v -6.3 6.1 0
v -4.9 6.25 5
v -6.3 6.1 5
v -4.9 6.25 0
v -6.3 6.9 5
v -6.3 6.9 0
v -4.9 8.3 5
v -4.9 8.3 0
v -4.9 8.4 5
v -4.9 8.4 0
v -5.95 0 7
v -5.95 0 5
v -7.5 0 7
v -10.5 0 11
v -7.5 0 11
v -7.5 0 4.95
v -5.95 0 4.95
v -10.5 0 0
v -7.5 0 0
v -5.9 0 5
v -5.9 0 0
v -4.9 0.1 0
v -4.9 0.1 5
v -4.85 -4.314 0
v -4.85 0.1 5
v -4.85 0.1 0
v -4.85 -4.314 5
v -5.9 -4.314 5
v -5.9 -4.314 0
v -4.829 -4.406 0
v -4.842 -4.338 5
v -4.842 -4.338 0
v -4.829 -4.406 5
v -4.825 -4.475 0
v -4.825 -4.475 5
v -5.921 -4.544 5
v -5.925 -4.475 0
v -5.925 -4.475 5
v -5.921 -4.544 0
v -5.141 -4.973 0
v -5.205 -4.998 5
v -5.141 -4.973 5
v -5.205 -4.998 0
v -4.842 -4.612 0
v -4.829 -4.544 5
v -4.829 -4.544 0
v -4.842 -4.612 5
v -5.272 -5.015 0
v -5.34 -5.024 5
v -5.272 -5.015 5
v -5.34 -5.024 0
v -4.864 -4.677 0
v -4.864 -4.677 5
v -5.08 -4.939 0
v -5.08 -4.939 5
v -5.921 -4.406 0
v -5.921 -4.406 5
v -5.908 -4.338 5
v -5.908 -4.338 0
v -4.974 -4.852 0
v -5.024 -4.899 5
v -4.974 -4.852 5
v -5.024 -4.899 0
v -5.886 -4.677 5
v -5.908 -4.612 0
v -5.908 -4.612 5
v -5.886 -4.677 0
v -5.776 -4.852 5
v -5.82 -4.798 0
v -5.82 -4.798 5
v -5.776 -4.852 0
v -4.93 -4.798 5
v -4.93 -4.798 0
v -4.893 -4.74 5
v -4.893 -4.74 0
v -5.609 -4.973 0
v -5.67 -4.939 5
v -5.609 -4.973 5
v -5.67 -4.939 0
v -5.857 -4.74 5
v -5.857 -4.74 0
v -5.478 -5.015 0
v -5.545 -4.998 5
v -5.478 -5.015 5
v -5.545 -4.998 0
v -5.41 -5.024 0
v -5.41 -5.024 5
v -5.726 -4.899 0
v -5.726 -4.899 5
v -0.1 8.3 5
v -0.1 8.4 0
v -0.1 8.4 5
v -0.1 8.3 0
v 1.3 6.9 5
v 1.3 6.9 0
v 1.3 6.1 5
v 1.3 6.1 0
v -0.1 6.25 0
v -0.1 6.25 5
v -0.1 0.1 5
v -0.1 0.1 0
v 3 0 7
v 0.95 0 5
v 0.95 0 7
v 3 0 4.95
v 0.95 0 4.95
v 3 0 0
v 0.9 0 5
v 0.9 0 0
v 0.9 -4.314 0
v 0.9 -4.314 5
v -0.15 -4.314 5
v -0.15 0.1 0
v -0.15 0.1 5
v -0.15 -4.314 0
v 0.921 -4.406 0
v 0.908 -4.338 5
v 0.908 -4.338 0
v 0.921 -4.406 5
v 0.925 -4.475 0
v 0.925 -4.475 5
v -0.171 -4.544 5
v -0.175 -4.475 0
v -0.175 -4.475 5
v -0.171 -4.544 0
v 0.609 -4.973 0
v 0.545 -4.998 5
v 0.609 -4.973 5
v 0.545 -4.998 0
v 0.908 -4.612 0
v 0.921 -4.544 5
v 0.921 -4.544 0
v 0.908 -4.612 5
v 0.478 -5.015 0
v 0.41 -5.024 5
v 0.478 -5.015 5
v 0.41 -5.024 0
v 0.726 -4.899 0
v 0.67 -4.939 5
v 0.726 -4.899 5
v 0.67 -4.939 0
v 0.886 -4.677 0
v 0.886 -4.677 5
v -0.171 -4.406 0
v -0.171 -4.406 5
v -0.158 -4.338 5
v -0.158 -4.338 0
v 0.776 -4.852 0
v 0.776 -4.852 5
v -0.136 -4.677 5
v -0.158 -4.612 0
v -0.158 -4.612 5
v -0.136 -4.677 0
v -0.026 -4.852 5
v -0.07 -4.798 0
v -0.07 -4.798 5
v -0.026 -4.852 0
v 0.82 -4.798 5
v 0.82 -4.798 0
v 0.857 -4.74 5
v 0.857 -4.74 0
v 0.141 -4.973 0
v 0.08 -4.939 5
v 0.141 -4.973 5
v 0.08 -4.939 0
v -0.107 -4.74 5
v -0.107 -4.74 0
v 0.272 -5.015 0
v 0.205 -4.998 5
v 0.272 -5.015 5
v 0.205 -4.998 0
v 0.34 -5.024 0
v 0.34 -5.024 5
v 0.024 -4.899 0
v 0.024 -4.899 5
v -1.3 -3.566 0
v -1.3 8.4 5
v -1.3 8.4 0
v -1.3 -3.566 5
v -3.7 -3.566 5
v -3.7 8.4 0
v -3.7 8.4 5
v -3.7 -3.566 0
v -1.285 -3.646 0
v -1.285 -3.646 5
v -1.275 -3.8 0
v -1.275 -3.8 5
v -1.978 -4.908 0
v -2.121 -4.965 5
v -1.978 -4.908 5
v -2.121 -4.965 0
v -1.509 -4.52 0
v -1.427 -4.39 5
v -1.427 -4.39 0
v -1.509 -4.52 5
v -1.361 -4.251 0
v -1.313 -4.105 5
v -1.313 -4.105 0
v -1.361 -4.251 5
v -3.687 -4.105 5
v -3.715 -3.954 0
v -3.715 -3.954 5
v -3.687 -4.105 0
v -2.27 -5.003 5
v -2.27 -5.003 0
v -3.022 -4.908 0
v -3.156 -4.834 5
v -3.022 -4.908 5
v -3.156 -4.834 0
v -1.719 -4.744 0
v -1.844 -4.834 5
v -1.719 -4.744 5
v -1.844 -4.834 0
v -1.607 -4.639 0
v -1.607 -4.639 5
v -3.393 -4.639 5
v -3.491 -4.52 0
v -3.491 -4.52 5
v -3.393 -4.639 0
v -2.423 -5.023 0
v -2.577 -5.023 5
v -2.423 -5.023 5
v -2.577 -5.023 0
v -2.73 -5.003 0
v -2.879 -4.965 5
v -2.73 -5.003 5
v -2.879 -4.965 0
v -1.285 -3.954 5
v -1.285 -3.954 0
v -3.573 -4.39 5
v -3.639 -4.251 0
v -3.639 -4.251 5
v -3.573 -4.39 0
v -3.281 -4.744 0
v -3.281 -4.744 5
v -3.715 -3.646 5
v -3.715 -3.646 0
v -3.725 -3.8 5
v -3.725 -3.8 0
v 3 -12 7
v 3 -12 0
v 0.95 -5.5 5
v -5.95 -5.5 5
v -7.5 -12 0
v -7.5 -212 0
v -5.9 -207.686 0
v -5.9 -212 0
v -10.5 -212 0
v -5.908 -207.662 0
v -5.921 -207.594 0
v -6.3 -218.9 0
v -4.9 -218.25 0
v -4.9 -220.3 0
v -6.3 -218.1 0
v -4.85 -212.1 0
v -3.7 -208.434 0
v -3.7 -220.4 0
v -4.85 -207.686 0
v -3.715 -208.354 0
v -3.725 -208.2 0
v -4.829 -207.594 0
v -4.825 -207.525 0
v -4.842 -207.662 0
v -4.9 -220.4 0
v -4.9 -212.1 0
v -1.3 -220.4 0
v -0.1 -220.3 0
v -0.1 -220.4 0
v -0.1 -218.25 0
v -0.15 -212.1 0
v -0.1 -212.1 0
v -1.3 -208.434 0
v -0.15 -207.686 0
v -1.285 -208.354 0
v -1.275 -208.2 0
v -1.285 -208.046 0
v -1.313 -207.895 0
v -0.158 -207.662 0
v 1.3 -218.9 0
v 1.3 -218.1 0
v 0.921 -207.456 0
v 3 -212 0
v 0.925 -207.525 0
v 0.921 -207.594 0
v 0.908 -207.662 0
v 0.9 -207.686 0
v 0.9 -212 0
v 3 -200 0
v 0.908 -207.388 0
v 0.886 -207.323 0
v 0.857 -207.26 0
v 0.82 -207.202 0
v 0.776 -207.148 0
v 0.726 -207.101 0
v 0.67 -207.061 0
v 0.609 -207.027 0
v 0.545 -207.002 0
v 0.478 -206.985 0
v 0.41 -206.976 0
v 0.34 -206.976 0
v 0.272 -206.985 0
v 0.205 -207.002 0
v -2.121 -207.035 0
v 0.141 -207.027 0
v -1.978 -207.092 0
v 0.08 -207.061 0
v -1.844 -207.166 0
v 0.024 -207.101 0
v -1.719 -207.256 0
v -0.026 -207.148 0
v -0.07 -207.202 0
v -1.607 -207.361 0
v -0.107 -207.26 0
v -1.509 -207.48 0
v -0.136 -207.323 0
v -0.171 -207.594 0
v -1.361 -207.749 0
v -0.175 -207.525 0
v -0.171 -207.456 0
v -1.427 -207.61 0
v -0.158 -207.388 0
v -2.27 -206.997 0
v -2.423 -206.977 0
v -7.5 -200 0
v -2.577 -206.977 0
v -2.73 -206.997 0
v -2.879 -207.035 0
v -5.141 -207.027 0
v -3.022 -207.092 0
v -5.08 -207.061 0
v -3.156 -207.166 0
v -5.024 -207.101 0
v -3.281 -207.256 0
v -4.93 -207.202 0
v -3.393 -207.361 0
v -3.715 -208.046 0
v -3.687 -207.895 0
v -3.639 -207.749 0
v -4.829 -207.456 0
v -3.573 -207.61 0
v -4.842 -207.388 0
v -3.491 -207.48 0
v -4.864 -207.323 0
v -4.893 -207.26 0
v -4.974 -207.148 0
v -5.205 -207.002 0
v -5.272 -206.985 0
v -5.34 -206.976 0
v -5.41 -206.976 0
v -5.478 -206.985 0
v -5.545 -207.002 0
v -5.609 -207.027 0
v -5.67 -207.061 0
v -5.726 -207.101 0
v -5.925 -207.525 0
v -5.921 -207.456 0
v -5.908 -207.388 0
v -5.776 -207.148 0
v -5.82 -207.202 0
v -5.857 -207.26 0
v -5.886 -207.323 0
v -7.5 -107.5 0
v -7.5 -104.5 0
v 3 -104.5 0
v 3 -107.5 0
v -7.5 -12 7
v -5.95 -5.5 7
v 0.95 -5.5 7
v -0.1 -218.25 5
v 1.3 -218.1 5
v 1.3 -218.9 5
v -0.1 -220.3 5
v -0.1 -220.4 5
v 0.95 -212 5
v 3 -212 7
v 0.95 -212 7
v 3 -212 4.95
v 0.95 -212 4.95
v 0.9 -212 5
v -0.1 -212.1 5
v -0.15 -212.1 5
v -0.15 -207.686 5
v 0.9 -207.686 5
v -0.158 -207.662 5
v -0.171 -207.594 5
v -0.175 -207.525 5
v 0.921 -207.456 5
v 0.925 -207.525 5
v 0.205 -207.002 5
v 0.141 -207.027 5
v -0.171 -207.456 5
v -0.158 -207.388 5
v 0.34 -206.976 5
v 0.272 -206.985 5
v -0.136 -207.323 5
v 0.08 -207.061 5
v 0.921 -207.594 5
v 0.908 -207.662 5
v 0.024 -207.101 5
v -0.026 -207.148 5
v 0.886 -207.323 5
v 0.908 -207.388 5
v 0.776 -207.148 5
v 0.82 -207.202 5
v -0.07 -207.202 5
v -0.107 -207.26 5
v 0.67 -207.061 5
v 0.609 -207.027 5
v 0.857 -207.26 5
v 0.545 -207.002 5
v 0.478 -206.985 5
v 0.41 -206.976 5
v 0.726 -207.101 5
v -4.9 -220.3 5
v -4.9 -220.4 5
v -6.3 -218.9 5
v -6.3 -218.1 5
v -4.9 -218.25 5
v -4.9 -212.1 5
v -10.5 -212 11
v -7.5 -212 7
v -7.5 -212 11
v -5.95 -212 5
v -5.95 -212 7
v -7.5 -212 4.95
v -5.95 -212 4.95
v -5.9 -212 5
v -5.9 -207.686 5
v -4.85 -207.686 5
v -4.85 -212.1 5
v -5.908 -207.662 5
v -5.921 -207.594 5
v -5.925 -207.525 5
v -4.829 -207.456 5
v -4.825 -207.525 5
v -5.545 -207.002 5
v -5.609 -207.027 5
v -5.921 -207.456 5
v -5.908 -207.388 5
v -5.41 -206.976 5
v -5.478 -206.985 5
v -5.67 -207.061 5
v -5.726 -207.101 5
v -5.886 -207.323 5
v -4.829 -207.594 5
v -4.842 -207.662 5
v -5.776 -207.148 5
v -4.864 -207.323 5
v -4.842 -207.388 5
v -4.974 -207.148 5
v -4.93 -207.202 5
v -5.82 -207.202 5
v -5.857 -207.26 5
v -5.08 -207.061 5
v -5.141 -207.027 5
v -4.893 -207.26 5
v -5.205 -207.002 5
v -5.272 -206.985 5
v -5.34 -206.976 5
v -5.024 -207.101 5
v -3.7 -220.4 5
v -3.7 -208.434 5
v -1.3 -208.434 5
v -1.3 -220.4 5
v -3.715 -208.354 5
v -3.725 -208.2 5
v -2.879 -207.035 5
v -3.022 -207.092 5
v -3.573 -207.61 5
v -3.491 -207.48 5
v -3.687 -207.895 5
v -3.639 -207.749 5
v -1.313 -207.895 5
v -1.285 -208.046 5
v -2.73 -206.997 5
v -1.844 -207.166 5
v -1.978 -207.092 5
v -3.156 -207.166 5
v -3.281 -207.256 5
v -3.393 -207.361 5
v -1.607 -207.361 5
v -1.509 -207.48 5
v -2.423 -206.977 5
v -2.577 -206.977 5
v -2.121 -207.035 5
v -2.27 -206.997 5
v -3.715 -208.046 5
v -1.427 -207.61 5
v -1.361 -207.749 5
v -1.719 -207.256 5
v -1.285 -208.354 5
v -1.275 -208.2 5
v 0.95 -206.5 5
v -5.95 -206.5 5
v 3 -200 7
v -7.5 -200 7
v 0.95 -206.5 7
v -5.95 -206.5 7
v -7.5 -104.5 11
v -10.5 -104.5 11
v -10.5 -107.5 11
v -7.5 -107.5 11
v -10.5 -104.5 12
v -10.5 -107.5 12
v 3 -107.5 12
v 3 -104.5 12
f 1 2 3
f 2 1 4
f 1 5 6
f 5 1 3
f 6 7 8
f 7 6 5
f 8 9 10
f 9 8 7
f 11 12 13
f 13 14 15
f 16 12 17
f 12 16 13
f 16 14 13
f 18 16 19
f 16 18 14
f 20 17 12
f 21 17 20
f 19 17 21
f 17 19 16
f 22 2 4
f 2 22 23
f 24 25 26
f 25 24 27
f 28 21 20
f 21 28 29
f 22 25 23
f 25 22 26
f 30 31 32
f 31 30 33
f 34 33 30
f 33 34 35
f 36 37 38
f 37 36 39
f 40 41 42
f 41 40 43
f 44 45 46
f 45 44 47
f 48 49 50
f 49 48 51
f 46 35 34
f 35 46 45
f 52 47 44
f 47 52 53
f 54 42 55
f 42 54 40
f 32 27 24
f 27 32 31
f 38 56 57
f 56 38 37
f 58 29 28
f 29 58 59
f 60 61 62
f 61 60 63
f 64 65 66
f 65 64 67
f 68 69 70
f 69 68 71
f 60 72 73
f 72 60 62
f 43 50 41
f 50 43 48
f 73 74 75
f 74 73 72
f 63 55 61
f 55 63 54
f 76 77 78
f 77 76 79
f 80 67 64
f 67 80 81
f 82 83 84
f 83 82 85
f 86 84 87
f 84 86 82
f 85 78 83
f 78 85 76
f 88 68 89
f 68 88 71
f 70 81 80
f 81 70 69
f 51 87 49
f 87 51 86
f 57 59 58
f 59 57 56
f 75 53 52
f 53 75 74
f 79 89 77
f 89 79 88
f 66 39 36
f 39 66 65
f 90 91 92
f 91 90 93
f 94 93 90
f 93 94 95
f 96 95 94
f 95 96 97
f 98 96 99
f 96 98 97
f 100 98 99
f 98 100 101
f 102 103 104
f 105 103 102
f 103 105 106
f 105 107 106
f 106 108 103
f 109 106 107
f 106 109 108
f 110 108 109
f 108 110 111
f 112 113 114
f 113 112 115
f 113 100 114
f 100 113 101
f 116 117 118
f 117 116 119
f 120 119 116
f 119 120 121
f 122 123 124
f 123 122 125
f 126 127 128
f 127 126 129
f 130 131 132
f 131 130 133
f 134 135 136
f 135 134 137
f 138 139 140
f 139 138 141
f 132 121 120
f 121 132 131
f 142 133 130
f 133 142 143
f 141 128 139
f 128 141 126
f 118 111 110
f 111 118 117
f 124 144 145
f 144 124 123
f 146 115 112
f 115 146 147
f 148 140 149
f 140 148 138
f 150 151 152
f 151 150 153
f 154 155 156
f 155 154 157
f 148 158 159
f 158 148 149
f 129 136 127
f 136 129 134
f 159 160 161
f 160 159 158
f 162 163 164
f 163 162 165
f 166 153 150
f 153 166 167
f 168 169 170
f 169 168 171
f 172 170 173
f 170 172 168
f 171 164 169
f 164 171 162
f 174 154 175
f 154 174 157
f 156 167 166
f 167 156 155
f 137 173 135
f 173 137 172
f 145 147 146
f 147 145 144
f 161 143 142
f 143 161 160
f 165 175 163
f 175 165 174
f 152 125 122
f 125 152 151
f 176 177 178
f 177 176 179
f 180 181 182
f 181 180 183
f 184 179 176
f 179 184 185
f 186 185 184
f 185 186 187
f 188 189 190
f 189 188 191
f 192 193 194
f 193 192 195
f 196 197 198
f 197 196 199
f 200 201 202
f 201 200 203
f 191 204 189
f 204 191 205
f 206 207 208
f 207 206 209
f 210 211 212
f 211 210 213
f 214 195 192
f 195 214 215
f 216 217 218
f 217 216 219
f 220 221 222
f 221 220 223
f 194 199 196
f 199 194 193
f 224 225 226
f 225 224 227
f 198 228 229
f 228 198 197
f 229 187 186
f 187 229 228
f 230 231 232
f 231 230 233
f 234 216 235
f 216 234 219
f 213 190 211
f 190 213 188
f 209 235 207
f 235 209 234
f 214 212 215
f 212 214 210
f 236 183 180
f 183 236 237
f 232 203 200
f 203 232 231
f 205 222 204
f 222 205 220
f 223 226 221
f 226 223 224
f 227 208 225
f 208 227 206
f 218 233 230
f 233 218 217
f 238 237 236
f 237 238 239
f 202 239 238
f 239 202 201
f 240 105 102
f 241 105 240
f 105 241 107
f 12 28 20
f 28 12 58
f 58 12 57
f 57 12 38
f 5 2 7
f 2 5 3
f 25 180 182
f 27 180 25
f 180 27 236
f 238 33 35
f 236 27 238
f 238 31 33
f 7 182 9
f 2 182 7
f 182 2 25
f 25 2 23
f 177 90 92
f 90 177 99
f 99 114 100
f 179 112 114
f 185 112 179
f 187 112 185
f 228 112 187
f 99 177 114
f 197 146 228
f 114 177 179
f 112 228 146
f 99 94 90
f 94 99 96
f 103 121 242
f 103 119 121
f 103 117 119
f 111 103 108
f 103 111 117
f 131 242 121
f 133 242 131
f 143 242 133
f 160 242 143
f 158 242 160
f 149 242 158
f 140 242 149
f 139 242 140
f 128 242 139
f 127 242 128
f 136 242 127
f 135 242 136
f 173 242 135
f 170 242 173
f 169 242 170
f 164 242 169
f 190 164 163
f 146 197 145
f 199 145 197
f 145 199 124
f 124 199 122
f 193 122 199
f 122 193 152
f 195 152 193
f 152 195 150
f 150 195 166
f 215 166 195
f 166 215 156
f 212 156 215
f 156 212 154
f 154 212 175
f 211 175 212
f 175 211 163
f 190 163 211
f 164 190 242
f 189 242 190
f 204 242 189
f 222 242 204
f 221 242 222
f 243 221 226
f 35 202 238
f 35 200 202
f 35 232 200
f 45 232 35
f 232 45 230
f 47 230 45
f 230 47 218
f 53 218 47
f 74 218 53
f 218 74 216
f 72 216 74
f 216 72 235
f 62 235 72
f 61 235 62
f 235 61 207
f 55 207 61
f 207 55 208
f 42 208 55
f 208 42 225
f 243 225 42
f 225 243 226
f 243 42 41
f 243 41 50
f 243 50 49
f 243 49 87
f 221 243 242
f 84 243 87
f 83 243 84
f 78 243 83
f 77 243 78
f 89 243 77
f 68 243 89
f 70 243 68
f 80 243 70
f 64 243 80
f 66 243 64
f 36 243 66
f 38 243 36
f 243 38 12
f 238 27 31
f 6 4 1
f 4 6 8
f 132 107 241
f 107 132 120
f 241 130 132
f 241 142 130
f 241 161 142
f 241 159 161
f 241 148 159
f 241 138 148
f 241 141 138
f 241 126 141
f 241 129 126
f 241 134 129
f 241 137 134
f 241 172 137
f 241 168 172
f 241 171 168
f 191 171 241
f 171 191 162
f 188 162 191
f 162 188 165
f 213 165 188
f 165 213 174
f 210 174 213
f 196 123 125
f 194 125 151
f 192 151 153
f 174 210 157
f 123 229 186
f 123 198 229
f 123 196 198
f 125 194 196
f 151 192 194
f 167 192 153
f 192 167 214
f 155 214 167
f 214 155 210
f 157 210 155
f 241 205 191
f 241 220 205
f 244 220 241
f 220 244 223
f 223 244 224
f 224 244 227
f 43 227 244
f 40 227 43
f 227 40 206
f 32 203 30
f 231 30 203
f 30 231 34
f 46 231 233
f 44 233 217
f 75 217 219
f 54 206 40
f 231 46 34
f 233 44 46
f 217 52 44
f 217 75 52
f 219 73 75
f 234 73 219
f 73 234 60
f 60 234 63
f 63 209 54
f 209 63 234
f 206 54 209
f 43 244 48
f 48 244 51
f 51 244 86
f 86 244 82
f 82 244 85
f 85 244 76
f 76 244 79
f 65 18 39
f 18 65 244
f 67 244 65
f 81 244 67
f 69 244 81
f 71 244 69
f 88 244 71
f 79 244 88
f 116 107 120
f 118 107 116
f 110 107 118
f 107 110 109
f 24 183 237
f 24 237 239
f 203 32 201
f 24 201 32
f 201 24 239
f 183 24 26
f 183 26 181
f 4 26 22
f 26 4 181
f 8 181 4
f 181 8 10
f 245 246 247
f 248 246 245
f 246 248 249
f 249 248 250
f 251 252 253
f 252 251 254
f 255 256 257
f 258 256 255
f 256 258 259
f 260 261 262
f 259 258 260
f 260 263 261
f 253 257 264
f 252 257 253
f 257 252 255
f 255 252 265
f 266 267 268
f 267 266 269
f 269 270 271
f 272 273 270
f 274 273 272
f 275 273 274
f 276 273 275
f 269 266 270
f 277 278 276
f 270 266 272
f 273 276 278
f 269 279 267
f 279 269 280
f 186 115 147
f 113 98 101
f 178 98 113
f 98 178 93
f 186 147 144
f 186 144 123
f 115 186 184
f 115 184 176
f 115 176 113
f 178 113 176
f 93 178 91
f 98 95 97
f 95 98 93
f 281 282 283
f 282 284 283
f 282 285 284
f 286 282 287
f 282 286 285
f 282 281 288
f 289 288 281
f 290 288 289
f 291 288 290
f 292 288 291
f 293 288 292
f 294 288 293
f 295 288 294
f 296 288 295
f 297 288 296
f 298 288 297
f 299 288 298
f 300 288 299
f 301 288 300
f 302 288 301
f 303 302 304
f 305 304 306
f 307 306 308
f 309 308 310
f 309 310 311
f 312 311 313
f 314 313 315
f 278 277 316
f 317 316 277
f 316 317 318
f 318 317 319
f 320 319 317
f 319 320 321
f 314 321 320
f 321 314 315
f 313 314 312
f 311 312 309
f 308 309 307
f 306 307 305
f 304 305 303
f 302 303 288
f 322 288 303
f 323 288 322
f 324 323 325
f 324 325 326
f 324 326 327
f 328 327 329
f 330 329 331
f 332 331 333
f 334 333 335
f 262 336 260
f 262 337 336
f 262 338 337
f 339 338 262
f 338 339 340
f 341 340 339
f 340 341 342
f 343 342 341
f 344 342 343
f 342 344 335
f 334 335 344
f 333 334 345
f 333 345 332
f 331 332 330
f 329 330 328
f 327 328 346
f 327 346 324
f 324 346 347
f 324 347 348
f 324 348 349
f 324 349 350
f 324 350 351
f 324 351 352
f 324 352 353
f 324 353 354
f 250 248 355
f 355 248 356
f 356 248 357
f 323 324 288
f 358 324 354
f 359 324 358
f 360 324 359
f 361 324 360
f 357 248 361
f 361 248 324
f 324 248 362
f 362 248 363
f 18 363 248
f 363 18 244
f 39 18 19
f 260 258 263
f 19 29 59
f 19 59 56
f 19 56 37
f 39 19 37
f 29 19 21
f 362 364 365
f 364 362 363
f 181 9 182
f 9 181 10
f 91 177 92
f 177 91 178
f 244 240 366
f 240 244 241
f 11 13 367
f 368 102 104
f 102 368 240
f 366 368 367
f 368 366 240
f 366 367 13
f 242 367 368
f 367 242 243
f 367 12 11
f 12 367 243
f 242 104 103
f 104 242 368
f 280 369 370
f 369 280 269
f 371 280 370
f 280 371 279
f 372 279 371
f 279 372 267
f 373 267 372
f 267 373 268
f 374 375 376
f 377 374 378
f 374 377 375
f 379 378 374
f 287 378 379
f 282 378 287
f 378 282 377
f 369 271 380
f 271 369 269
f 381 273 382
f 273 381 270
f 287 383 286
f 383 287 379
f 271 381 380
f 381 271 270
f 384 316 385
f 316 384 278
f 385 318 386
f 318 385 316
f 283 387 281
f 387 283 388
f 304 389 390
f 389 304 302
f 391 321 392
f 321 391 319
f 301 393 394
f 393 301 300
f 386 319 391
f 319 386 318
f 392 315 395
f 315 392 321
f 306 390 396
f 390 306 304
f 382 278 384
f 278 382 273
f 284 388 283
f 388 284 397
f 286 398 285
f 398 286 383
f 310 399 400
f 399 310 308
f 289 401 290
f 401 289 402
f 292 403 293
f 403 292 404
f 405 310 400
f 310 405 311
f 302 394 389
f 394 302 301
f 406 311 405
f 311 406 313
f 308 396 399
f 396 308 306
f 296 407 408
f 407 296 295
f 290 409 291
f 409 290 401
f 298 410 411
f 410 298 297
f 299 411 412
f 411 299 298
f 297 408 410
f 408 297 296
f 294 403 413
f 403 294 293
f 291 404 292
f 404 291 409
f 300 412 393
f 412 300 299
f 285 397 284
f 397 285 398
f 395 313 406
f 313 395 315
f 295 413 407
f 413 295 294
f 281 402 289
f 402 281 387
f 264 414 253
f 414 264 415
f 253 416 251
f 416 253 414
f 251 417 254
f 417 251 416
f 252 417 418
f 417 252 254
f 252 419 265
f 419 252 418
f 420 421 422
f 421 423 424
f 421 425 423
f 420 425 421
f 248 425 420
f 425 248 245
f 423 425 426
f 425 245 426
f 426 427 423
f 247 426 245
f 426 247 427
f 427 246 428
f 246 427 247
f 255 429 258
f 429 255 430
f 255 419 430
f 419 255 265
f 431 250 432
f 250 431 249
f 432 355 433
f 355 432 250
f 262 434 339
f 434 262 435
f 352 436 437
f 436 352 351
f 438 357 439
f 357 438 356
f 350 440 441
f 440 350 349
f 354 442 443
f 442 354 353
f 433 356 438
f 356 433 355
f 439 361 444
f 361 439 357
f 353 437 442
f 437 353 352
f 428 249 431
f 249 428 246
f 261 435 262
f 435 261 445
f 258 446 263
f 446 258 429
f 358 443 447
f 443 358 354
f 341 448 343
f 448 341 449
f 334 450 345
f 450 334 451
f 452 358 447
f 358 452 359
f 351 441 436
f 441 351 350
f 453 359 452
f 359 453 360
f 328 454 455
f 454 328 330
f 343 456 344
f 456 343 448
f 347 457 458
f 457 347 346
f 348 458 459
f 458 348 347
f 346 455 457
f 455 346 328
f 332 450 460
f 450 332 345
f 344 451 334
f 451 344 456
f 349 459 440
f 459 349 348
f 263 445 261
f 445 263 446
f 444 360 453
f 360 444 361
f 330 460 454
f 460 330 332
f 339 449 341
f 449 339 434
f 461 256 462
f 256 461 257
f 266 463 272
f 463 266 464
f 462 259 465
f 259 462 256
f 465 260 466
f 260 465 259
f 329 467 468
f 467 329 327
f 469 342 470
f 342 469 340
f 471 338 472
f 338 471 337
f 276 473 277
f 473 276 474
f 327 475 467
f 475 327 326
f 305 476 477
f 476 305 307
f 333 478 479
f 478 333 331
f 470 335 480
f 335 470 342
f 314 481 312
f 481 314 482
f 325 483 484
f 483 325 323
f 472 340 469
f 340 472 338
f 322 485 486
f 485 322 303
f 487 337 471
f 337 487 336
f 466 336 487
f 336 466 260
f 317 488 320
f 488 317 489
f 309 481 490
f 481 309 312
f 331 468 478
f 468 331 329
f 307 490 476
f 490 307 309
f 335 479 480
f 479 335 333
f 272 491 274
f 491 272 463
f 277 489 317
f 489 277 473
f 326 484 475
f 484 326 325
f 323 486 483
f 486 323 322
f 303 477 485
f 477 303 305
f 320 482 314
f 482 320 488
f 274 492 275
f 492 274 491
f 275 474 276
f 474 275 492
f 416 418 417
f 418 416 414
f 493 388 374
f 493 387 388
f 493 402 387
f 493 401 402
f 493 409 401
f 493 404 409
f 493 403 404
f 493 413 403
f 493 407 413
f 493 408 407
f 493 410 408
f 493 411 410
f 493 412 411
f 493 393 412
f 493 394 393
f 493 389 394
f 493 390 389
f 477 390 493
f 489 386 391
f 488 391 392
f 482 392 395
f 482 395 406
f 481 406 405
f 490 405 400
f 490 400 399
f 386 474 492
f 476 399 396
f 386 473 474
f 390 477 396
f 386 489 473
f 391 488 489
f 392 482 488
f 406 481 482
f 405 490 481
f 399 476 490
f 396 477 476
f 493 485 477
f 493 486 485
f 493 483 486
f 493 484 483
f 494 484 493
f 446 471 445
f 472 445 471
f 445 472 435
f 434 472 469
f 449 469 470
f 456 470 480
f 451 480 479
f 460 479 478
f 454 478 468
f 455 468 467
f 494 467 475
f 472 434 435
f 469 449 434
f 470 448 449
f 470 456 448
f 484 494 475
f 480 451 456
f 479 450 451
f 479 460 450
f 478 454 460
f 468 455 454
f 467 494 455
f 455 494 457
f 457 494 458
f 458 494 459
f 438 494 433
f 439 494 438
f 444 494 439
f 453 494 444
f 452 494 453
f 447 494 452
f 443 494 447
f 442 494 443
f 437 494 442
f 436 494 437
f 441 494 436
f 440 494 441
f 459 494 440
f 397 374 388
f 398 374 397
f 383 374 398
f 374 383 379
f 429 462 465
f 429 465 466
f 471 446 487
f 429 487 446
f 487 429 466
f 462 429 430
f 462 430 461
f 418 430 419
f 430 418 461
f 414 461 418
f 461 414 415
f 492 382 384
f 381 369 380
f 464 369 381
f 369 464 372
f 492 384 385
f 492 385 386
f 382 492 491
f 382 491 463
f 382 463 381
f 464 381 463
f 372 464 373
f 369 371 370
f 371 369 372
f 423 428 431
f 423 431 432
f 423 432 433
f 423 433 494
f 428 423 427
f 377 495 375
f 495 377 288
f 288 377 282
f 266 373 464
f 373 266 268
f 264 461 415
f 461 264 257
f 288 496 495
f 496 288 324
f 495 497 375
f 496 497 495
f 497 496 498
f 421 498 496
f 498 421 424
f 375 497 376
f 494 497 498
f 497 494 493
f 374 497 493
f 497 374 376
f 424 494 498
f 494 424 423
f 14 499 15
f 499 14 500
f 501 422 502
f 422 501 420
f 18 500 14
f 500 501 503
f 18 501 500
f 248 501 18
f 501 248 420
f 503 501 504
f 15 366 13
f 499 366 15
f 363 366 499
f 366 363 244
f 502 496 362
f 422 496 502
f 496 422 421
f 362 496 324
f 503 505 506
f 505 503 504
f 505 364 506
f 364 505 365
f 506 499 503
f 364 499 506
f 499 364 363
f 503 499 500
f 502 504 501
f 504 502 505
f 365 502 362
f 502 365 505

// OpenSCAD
$fn = 50;

difference() {
	union() {
		translate(v = [0, 0, 0]) {
			rotate(a = [0, 0, 0]) {
				difference() {
					union() {
						translate(v = [0, 0, 2.5]) {
							rotate(a = [0, -90, 0]) {
								difference() {
									union() {
										translate(v = [0, 0, 0]) {
											rotate(a = [0, 0, 0]) {
												difference() {
													union() {
														translate(v = [-2.5, 0, 2.5]) {
															rotate(a = [0, 90.0, 0]) {
																difference() {
																	union() {
																		translate(v = [0, 0, 0]) {
																			rotate(a = [0, 0, 0]) {
																				difference() {
																					union() {
																						translate(v = [0, 0, 0]) {
																							rotate(a = [0, 0, 0]) {
																								difference() {
																									union() {
																										translate(v = [-5.5, -12.0, 0]) {
																											cube(size = [11.0, 20.4, 5.0]);
																										}
																									}
																									union() {
																										translate(v = [0, 0, -0.1]) {
																											linear_extrude(height = 5.2) {
																												polygon(points = [[-2.4, 0], [-2.4, 6.25], [-3.8, 6.1], [-3.8, 6.8999999999999995], [-2.4, 8.299999999999999], [-2.4, 9.399999999999999], [-5.7, 9.399999999999999], [-5.7, 0]]);
																											}
																										}
																										translate(v = [0, 0, -0.1]) {
																											linear_extrude(height = 5.2) {
																												polygon(points = [[-2.35, -4.5], [-2.35, -4.3875], [-2.35, -4.275], [-2.35, -4.1625], [-2.35, -4.05], [-2.35, -3.9375], [-2.35, -3.825], [-2.35, -3.7125], [-2.35, -3.6], [-2.35, -3.4875], [-2.35, -3.375], [-2.35, -3.2625], [-2.35, -3.15], [-2.35, -3.0375], [-2.35, -2.925], [-2.35, -2.8125], [-2.35, -2.7], [-2.35, -2.5875], [-2.35, -2.475], [-2.35, -2.3625], [-2.35, -2.25], [-2.35, -2.1375], [-2.35, -2.025], [-2.35, -1.9125], [-2.35, -1.7999999999999998], [-2.35, -1.6875], [-2.35, -1.5750000000000002], [-2.35, -1.4625], [-2.35, -1.35], [-2.35, -1.2374999999999998], [-2.35, -1.125], [-2.35, -1.0125000000000002], [-2.35, -0.8999999999999999], [-2.35, -0.7875000000000001], [-2.35, -0.6749999999999998], [-2.35, -0.5625], [-2.35, -0.4500000000000002], [-2.35, -0.33750000000000036], [-2.35, -0.22499999999999964], [-2.35, -0.11249999999999982], [-2.35, 0.0], [-2.35, 0.1], [-3.4, 0.1], [-3.4, -4.5]]);
																											}
																										}
																										translate(v = [-2.875, -4.475, -0.1]) {
																											cylinder(h = 5.2, r = 0.55);
																										}
																										translate(v = [0, 0, -0.1]) {
																											linear_extrude(height = 5.2) {
																												polygon(points = [[2.4, 0], [2.4, 6.25], [3.8, 6.1], [3.8, 6.8999999999999995], [2.4, 8.299999999999999], [2.4, 9.399999999999999], [5.7, 9.399999999999999], [5.7, 0]]);
																											}
																										}
																										translate(v = [0, 0, -0.1]) {
																											linear_extrude(height = 5.2) {
																												polygon(points = [[2.35, -4.5], [2.35, -4.3875], [2.35, -4.275], [2.35, -4.1625], [2.35, -4.05], [2.35, -3.9375], [2.35, -3.825], [2.35, -3.7125], [2.35, -3.6], [2.35, -3.4875], [2.35, -3.375], [2.35, -3.2625], [2.35, -3.15], [2.35, -3.0375], [2.35, -2.925], [2.35, -2.8125], [2.35, -2.7], [2.35, -2.5875], [2.35, -2.475], [2.35, -2.3625], [2.35, -2.25], [2.35, -2.1375], [2.35, -2.025], [2.35, -1.9125], [2.35, -1.7999999999999998], [2.35, -1.6875], [2.35, -1.5750000000000002], [2.35, -1.4625], [2.35, -1.35], [2.35, -1.2374999999999998], [2.35, -1.125], [2.35, -1.0125000000000002], [2.35, -0.8999999999999999], [2.35, -0.7875000000000001], [2.35, -0.6749999999999998], [2.35, -0.5625], [2.35, -0.4500000000000002], [2.35, -0.33750000000000036], [2.35, -0.22499999999999964], [2.35, -0.11249999999999982], [2.35, 0.0], [2.35, 0.1], [3.4, 0.1], [3.4, -4.5]]);
																											}
																										}
																										translate(v = [2.875, -4.475, -0.1]) {
																											cylinder(h = 5.2, r = 0.55);
																										}
																										translate(v = [0, 0, -0.1]) {
																											linear_extrude(height = 5.2) {
																												polygon(points = [[-1.2, -3.8499999999999996], [-1.2, -3.6607142857142856], [-1.2, -3.471428571428571], [-1.2, -3.2821428571428566], [-1.2, -3.0928571428571425], [-1.2, -2.9035714285714285], [-1.2, -2.714285714285714], [-1.2, -2.5249999999999995], [-1.2, -2.3357142857142854], [-1.2, -2.1464285714285714], [-1.2, -1.9571428571428569], [-1.2, -1.7678571428571423], [-1.2, -1.5785714285714283], [-1.2, -1.3892857142857138], [-1.2, -1.1999999999999997], [-1.2, -1.0107142857142852], [-1.2, -0.8214285714285712], [-1.2, -0.6321428571428567], [-1.2, -0.4428571428571426], [-1.2, -0.2535714285714281], [-1.2, -0.06428571428571406], [-1.2, 0], [-1.2, 0.12500000000000044], [-1.2, 0.31428571428571495], [-1.2, 0.503571428571429], [-1.2, 0.6928571428571431], [-1.2, 0.8821428571428571], [-1.2, 1.071428571428572], [-1.2, 1.2607142857142861], [-1.2, 1.4500000000000002], [-1.2, 1.6392857142857142], [-1.2, 1.8285714285714292], [-1.2, 2.0178571428571432], [-1.2, 2.2071428571428573], [-1.2, 2.3964285714285714], [-1.2, 2.5857142857142863], [-1.2, 2.7750000000000004], [-1.2, 2.9642857142857144], [-1.2, 3.1535714285714294], [-1.2, 3.3428571428571434], [-1.2, 3.5321428571428575], [-1.2, 3.7214285714285715], [-1.2, 3.9107142857142865], [-1.2, 4.1000000000000005], [-1.2, 4.289285714285715], [-1.2, 4.4785714285714295], [-1.2, 4.667857142857143], [-1.2, 4.857142857142858], [-1.2, 5.046428571428573], [-1.2, 5.235714285714286], [-1.2, 5.425000000000001], [-1.2, 5.614285714285714], [-1.2, 5.803571428571429], [-1.2, 5.992857142857144], [-1.2, 6.1], [-1.2, 6.182142857142857], [-1.2, 6.25], [-1.2, 6.371428571428572], [-1.2, 6.560714285714287], [-1.2, 6.75], [-1.2, 6.939285714285715], [-1.2, 7.128571428571428], [-1.2, 7.317857142857143], [-1.2, 7.507142857142858], [-1.2, 7.696428571428571], [-1.2, 7.885714285714286], [-1.2, 8.075000000000001], [-1.2, 8.264285714285714], [-1.2, 8.45357142857143], [-1.2, 8.642857142857142], [-1.2, 8.832142857142857], [-1.2, 9.021428571428572], [-1.2, 9.210714285714285], [-1.2, 9.4], [1.2, 9.4], [1.2, 9.210714285714285], [1.2, 9.021428571428572], [1.2, 8.832142857142857], [1.2, 8.642857142857142], [1.2, 8.45357142857143], [1.2, 8.264285714285714], [1.2, 8.075000000000001], [1.2, 7.885714285714286], [1.2, 7.696428571428571], [1.2, 7.507142857142858], [1.2, 7.317857142857143], [1.2, 7.128571428571428], [1.2, 6.939285714285715], [1.2, 6.75], [1.2, 6.560714285714287], [1.2, 6.371428571428572], [1.2, 6.25], [1.2, 6.182142857142857], [1.2, 6.1], [1.2, 5.992857142857144], [1.2, 5.803571428571429], [1.2, 5.614285714285714], [1.2, 5.425000000000001], [1.2, 5.235714285714286], [1.2, 5.046428571428573], [1.2, 4.857142857142858], [1.2, 4.667857142857143], [1.2, 4.4785714285714295], [1.2, 4.289285714285715], [1.2, 4.1000000000000005], [1.2, 3.9107142857142865], [1.2, 3.7214285714285715], [1.2, 3.5321428571428575], [1.2, 3.3428571428571434], [1.2, 3.1535714285714294], [1.2, 2.9642857142857144], [1.2, 2.7750000000000004], [1.2, 2.5857142857142863], [1.2, 2.3964285714285714], [1.2, 2.2071428571428573], [1.2, 2.0178571428571432], [1.2, 1.8285714285714292], [1.2, 1.6392857142857142], [1.2, 1.4500000000000002], [1.2, 1.2607142857142861], [1.2, 1.071428571428572], [1.2, 0.8821428571428571], [1.2, 0.6928571428571431], [1.2, 0.503571428571429], [1.2, 0.31428571428571495], [1.2, 0.12500000000000044], [1.2, 0], [1.2, -0.06428571428571406], [1.2, -0.2535714285714281], [1.2, -0.4428571428571426], [1.2, -0.6321428571428567], [1.2, -0.8214285714285712], [1.2, -1.0107142857142852], [1.2, -1.1999999999999997], [1.2, -1.3892857142857138], [1.2, -1.5785714285714283], [1.2, -1.7678571428571423], [1.2, -1.9571428571428569], [1.2, -2.1464285714285714], [1.2, -2.3357142857142854], [1.2, -2.5249999999999995], [1.2, -2.714285714285714], [1.2, -2.9035714285714285], [1.2, -3.0928571428571425], [1.2, -3.2821428571428566], [1.2, -3.471428571428571], [1.2, -3.6607142857142856], [1.2, -3.8499999999999996]]);
																											}
																										}
																										translate(v = [0, -3.8, -0.1]) {
																											cylinder(h = 5.2, r = 1.2249999999999999);
																										}
																									}
																								}
																							}
																						}
																						translate(v = [0, 0, 0]) {
																							rotate(a = [0, 0, 0]) {
																								difference() {
																									union() {
																										translate(v = [-5.5, -12.0, 4.95]) {
																											cube(size = [11.0, 6.5, 2.05]);
																										}
																									}
																									union();
																								}
																							}
																						}
																						translate(v = [-5.5, -12.0, 4.95]) {
																							cube(size = [2.0500000000000003, 12.0, 2.05]);
																						}
																						translate(v = [3.4499999999999997, -12.0, 4.95]) {
																							cube(size = [2.0500000000000003, 12.0, 2.05]);
																						}
																					}
																					union();
																				}
																			}
																		}
																	}
																	union();
																}
															}
														}
													}
													union();
												}
											}
										}
										translate(v = [-2.5, -212.0, 2.5]) {
											rotate(a = [180, -90, 0]) {
												difference() {
													union() {
														translate(v = [0, 0, 0]) {
															rotate(a = [0, 0, 0]) {
																difference() {
																	union() {
																		translate(v = [0, 0, 0]) {
																			rotate(a = [0, 0, 0]) {
																				difference() {
																					union() {
																						translate(v = [-5.5, -12.0, 0]) {
																							cube(size = [11.0, 20.4, 5.0]);
																						}
																					}
																					union() {
																						translate(v = [0, 0, -0.1]) {
																							linear_extrude(height = 5.2) {
																								polygon(points = [[-2.4, 0], [-2.4, 6.25], [-3.8, 6.1], [-3.8, 6.8999999999999995], [-2.4, 8.299999999999999], [-2.4, 9.399999999999999], [-5.7, 9.399999999999999], [-5.7, 0]]);
																							}
																						}
																						translate(v = [0, 0, -0.1]) {
																							linear_extrude(height = 5.2) {
																								polygon(points = [[-2.35, -4.5], [-2.35, -4.3875], [-2.35, -4.275], [-2.35, -4.1625], [-2.35, -4.05], [-2.35, -3.9375], [-2.35, -3.825], [-2.35, -3.7125], [-2.35, -3.6], [-2.35, -3.4875], [-2.35, -3.375], [-2.35, -3.2625], [-2.35, -3.15], [-2.35, -3.0375], [-2.35, -2.925], [-2.35, -2.8125], [-2.35, -2.7], [-2.35, -2.5875], [-2.35, -2.475], [-2.35, -2.3625], [-2.35, -2.25], [-2.35, -2.1375], [-2.35, -2.025], [-2.35, -1.9125], [-2.35, -1.7999999999999998], [-2.35, -1.6875], [-2.35, -1.5750000000000002], [-2.35, -1.4625], [-2.35, -1.35], [-2.35, -1.2374999999999998], [-2.35, -1.125], [-2.35, -1.0125000000000002], [-2.35, -0.8999999999999999], [-2.35, -0.7875000000000001], [-2.35, -0.6749999999999998], [-2.35, -0.5625], [-2.35, -0.4500000000000002], [-2.35, -0.33750000000000036], [-2.35, -0.22499999999999964], [-2.35, -0.11249999999999982], [-2.35, 0.0], [-2.35, 0.1], [-3.4, 0.1], [-3.4, -4.5]]);
																							}
																						}
																						translate(v = [-2.875, -4.475, -0.1]) {
																							cylinder(h = 5.2, r = 0.55);
																						}
																						translate(v = [0, 0, -0.1]) {
																							linear_extrude(height = 5.2) {
																								polygon(points = [[2.4, 0], [2.4, 6.25], [3.8, 6.1], [3.8, 6.8999999999999995], [2.4, 8.299999999999999], [2.4, 9.399999999999999], [5.7, 9.399999999999999], [5.7, 0]]);
																							}
																						}
																						translate(v = [0, 0, -0.1]) {
																							linear_extrude(height = 5.2) {
																								polygon(points = [[2.35, -4.5], [2.35, -4.3875], [2.35, -4.275], [2.35, -4.1625], [2.35, -4.05], [2.35, -3.9375], [2.35, -3.825], [2.35, -3.7125], [2.35, -3.6], [2.35, -3.4875], [2.35, -3.375], [2.35, -3.2625], [2.35, -3.15], [2.35, -3.0375], [2.35, -2.925], [2.35, -2.8125], [2.35, -2.7], [2.35, -2.5875], [2.35, -2.475], [2.35, -2.3625], [2.35, -2.25], [2.35, -2.1375], [2.35, -2.025], [2.35, -1.9125], [2.35, -1.7999999999999998], [2.35, -1.6875], [2.35, -1.5750000000000002], [2.35, -1.4625], [2.35, -1.35], [2.35, -1.2374999999999998], [2.35, -1.125], [2.35, -1.0125000000000002], [2.35, -0.8999999999999999], [2.35, -0.7875000000000001], [2.35, -0.6749999999999998], [2.35, -0.5625], [2.35, -0.4500000000000002], [2.35, -0.33750000000000036], [2.35, -0.22499999999999964], [2.35, -0.11249999999999982], [2.35, 0.0], [2.35, 0.1], [3.4, 0.1], [3.4, -4.5]]);
																							}
																						}
																						translate(v = [2.875, -4.475, -0.1]) {
																							cylinder(h = 5.2, r = 0.55);
																						}
																						translate(v = [0, 0, -0.1]) {
																							linear_extrude(height = 5.2) {
																								polygon(points = [[-1.2, -3.8499999999999996], [-1.2, -3.6607142857142856], [-1.2, -3.471428571428571], [-1.2, -3.2821428571428566], [-1.2, -3.0928571428571425], [-1.2, -2.9035714285714285], [-1.2, -2.714285714285714], [-1.2, -2.5249999999999995], [-1.2, -2.3357142857142854], [-1.2, -2.1464285714285714], [-1.2, -1.9571428571428569], [-1.2, -1.7678571428571423], [-1.2, -1.5785714285714283], [-1.2, -1.3892857142857138], [-1.2, -1.1999999999999997], [-1.2, -1.0107142857142852], [-1.2, -0.8214285714285712], [-1.2, -0.6321428571428567], [-1.2, -0.4428571428571426], [-1.2, -0.2535714285714281], [-1.2, -0.06428571428571406], [-1.2, 0], [-1.2, 0.12500000000000044], [-1.2, 0.31428571428571495], [-1.2, 0.503571428571429], [-1.2, 0.6928571428571431], [-1.2, 0.8821428571428571], [-1.2, 1.071428571428572], [-1.2, 1.2607142857142861], [-1.2, 1.4500000000000002], [-1.2, 1.6392857142857142], [-1.2, 1.8285714285714292], [-1.2, 2.0178571428571432], [-1.2, 2.2071428571428573], [-1.2, 2.3964285714285714], [-1.2, 2.5857142857142863], [-1.2, 2.7750000000000004], [-1.2, 2.9642857142857144], [-1.2, 3.1535714285714294], [-1.2, 3.3428571428571434], [-1.2, 3.5321428571428575], [-1.2, 3.7214285714285715], [-1.2, 3.9107142857142865], [-1.2, 4.1000000000000005], [-1.2, 4.289285714285715], [-1.2, 4.4785714285714295], [-1.2, 4.667857142857143], [-1.2, 4.857142857142858], [-1.2, 5.046428571428573], [-1.2, 5.235714285714286], [-1.2, 5.425000000000001], [-1.2, 5.614285714285714], [-1.2, 5.803571428571429], [-1.2, 5.992857142857144], [-1.2, 6.1], [-1.2, 6.182142857142857], [-1.2, 6.25], [-1.2, 6.371428571428572], [-1.2, 6.560714285714287], [-1.2, 6.75], [-1.2, 6.939285714285715], [-1.2, 7.128571428571428], [-1.2, 7.317857142857143], [-1.2, 7.507142857142858], [-1.2, 7.696428571428571], [-1.2, 7.885714285714286], [-1.2, 8.075000000000001], [-1.2, 8.264285714285714], [-1.2, 8.45357142857143], [-1.2, 8.642857142857142], [-1.2, 8.832142857142857], [-1.2, 9.021428571428572], [-1.2, 9.210714285714285], [-1.2, 9.4], [1.2, 9.4], [1.2, 9.210714285714285], [1.2, 9.021428571428572], [1.2, 8.832142857142857], [1.2, 8.642857142857142], [1.2, 8.45357142857143], [1.2, 8.264285714285714], [1.2, 8.075000000000001], [1.2, 7.885714285714286], [1.2, 7.696428571428571], [1.2, 7.507142857142858], [1.2, 7.317857142857143], [1.2, 7.128571428571428], [1.2, 6.939285714285715], [1.2, 6.75], [1.2, 6.560714285714287], [1.2, 6.371428571428572], [1.2, 6.25], [1.2, 6.182142857142857], [1.2, 6.1], [1.2, 5.992857142857144], [1.2, 5.803571428571429], [1.2, 5.614285714285714], [1.2, 5.425000000000001], [1.2, 5.235714285714286], [1.2, 5.046428571428573], [1.2, 4.857142857142858], [1.2, 4.667857142857143], [1.2, 4.4785714285714295], [1.2, 4.289285714285715], [1.2, 4.1000000000000005], [1.2, 3.9107142857142865], [1.2, 3.7214285714285715], [1.2, 3.5321428571428575], [1.2, 3.3428571428571434], [1.2, 3.1535714285714294], [1.2, 2.9642857142857144], [1.2, 2.7750000000000004], [1.2, 2.5857142857142863], [1.2, 2.3964285714285714], [1.2, 2.2071428571428573], [1.2, 2.0178571428571432], [1.2, 1.8285714285714292], [1.2, 1.6392857142857142], [1.2, 1.4500000000000002], [1.2, 1.2607142857142861], [1.2, 1.071428571428572], [1.2, 0.8821428571428571], [1.2, 0.6928571428571431], [1.2, 0.503571428571429], [1.2, 0.31428571428571495], [1.2, 0.12500000000000044], [1.2, 0], [1.2, -0.06428571428571406], [1.2, -0.2535714285714281], [1.2, -0.4428571428571426], [1.2, -0.6321428571428567], [1.2, -0.8214285714285712], [1.2, -1.0107142857142852], [1.2, -1.1999999999999997], [1.2, -1.3892857142857138], [1.2, -1.5785714285714283], [1.2, -1.7678571428571423], [1.2, -1.9571428571428569], [1.2, -2.1464285714285714], [1.2, -2.3357142857142854], [1.2, -2.5249999999999995], [1.2, -2.714285714285714], [1.2, -2.9035714285714285], [1.2, -3.0928571428571425], [1.2, -3.2821428571428566], [1.2, -3.471428571428571], [1.2, -3.6607142857142856], [1.2, -3.8499999999999996]]);
																							}
																						}
																						translate(v = [0, -3.8, -0.1]) {
																							cylinder(h = 5.2, r = 1.2249999999999999);
																						}
																					}
																				}
																			}
																		}
																		translate(v = [0, 0, 0]) {
																			rotate(a = [0, 0, 0]) {
																				difference() {
																					union() {
																						translate(v = [-5.5, -12.0, 4.95]) {
																							cube(size = [11.0, 6.5, 2.05]);
																						}
																					}
																					union();
																				}
																			}
																		}
																		translate(v = [-5.5, -12.0, 4.95]) {
																			cube(size = [2.0500000000000003, 12.0, 2.05]);
																		}
																		translate(v = [3.4499999999999997, -12.0, 4.95]) {
																			cube(size = [2.0500000000000003, 12.0, 2.05]);
																		}
																	}
																	union();
																}
															}
														}
													}
													union();
												}
											}
										}
										translate(v = [-2.5, -212.0, 7.5]) {
											cube(size = [11.0, 212.0, 3.0]);
										}
										translate(v = [-2.5, -107.5, -3.0]) {
											cube(size = [12.0, 3.0, 13.5]);
										}
									}
									union();
								}
							}
						}
					}
					union();
				}
			}
		}
	}
	union();
}
